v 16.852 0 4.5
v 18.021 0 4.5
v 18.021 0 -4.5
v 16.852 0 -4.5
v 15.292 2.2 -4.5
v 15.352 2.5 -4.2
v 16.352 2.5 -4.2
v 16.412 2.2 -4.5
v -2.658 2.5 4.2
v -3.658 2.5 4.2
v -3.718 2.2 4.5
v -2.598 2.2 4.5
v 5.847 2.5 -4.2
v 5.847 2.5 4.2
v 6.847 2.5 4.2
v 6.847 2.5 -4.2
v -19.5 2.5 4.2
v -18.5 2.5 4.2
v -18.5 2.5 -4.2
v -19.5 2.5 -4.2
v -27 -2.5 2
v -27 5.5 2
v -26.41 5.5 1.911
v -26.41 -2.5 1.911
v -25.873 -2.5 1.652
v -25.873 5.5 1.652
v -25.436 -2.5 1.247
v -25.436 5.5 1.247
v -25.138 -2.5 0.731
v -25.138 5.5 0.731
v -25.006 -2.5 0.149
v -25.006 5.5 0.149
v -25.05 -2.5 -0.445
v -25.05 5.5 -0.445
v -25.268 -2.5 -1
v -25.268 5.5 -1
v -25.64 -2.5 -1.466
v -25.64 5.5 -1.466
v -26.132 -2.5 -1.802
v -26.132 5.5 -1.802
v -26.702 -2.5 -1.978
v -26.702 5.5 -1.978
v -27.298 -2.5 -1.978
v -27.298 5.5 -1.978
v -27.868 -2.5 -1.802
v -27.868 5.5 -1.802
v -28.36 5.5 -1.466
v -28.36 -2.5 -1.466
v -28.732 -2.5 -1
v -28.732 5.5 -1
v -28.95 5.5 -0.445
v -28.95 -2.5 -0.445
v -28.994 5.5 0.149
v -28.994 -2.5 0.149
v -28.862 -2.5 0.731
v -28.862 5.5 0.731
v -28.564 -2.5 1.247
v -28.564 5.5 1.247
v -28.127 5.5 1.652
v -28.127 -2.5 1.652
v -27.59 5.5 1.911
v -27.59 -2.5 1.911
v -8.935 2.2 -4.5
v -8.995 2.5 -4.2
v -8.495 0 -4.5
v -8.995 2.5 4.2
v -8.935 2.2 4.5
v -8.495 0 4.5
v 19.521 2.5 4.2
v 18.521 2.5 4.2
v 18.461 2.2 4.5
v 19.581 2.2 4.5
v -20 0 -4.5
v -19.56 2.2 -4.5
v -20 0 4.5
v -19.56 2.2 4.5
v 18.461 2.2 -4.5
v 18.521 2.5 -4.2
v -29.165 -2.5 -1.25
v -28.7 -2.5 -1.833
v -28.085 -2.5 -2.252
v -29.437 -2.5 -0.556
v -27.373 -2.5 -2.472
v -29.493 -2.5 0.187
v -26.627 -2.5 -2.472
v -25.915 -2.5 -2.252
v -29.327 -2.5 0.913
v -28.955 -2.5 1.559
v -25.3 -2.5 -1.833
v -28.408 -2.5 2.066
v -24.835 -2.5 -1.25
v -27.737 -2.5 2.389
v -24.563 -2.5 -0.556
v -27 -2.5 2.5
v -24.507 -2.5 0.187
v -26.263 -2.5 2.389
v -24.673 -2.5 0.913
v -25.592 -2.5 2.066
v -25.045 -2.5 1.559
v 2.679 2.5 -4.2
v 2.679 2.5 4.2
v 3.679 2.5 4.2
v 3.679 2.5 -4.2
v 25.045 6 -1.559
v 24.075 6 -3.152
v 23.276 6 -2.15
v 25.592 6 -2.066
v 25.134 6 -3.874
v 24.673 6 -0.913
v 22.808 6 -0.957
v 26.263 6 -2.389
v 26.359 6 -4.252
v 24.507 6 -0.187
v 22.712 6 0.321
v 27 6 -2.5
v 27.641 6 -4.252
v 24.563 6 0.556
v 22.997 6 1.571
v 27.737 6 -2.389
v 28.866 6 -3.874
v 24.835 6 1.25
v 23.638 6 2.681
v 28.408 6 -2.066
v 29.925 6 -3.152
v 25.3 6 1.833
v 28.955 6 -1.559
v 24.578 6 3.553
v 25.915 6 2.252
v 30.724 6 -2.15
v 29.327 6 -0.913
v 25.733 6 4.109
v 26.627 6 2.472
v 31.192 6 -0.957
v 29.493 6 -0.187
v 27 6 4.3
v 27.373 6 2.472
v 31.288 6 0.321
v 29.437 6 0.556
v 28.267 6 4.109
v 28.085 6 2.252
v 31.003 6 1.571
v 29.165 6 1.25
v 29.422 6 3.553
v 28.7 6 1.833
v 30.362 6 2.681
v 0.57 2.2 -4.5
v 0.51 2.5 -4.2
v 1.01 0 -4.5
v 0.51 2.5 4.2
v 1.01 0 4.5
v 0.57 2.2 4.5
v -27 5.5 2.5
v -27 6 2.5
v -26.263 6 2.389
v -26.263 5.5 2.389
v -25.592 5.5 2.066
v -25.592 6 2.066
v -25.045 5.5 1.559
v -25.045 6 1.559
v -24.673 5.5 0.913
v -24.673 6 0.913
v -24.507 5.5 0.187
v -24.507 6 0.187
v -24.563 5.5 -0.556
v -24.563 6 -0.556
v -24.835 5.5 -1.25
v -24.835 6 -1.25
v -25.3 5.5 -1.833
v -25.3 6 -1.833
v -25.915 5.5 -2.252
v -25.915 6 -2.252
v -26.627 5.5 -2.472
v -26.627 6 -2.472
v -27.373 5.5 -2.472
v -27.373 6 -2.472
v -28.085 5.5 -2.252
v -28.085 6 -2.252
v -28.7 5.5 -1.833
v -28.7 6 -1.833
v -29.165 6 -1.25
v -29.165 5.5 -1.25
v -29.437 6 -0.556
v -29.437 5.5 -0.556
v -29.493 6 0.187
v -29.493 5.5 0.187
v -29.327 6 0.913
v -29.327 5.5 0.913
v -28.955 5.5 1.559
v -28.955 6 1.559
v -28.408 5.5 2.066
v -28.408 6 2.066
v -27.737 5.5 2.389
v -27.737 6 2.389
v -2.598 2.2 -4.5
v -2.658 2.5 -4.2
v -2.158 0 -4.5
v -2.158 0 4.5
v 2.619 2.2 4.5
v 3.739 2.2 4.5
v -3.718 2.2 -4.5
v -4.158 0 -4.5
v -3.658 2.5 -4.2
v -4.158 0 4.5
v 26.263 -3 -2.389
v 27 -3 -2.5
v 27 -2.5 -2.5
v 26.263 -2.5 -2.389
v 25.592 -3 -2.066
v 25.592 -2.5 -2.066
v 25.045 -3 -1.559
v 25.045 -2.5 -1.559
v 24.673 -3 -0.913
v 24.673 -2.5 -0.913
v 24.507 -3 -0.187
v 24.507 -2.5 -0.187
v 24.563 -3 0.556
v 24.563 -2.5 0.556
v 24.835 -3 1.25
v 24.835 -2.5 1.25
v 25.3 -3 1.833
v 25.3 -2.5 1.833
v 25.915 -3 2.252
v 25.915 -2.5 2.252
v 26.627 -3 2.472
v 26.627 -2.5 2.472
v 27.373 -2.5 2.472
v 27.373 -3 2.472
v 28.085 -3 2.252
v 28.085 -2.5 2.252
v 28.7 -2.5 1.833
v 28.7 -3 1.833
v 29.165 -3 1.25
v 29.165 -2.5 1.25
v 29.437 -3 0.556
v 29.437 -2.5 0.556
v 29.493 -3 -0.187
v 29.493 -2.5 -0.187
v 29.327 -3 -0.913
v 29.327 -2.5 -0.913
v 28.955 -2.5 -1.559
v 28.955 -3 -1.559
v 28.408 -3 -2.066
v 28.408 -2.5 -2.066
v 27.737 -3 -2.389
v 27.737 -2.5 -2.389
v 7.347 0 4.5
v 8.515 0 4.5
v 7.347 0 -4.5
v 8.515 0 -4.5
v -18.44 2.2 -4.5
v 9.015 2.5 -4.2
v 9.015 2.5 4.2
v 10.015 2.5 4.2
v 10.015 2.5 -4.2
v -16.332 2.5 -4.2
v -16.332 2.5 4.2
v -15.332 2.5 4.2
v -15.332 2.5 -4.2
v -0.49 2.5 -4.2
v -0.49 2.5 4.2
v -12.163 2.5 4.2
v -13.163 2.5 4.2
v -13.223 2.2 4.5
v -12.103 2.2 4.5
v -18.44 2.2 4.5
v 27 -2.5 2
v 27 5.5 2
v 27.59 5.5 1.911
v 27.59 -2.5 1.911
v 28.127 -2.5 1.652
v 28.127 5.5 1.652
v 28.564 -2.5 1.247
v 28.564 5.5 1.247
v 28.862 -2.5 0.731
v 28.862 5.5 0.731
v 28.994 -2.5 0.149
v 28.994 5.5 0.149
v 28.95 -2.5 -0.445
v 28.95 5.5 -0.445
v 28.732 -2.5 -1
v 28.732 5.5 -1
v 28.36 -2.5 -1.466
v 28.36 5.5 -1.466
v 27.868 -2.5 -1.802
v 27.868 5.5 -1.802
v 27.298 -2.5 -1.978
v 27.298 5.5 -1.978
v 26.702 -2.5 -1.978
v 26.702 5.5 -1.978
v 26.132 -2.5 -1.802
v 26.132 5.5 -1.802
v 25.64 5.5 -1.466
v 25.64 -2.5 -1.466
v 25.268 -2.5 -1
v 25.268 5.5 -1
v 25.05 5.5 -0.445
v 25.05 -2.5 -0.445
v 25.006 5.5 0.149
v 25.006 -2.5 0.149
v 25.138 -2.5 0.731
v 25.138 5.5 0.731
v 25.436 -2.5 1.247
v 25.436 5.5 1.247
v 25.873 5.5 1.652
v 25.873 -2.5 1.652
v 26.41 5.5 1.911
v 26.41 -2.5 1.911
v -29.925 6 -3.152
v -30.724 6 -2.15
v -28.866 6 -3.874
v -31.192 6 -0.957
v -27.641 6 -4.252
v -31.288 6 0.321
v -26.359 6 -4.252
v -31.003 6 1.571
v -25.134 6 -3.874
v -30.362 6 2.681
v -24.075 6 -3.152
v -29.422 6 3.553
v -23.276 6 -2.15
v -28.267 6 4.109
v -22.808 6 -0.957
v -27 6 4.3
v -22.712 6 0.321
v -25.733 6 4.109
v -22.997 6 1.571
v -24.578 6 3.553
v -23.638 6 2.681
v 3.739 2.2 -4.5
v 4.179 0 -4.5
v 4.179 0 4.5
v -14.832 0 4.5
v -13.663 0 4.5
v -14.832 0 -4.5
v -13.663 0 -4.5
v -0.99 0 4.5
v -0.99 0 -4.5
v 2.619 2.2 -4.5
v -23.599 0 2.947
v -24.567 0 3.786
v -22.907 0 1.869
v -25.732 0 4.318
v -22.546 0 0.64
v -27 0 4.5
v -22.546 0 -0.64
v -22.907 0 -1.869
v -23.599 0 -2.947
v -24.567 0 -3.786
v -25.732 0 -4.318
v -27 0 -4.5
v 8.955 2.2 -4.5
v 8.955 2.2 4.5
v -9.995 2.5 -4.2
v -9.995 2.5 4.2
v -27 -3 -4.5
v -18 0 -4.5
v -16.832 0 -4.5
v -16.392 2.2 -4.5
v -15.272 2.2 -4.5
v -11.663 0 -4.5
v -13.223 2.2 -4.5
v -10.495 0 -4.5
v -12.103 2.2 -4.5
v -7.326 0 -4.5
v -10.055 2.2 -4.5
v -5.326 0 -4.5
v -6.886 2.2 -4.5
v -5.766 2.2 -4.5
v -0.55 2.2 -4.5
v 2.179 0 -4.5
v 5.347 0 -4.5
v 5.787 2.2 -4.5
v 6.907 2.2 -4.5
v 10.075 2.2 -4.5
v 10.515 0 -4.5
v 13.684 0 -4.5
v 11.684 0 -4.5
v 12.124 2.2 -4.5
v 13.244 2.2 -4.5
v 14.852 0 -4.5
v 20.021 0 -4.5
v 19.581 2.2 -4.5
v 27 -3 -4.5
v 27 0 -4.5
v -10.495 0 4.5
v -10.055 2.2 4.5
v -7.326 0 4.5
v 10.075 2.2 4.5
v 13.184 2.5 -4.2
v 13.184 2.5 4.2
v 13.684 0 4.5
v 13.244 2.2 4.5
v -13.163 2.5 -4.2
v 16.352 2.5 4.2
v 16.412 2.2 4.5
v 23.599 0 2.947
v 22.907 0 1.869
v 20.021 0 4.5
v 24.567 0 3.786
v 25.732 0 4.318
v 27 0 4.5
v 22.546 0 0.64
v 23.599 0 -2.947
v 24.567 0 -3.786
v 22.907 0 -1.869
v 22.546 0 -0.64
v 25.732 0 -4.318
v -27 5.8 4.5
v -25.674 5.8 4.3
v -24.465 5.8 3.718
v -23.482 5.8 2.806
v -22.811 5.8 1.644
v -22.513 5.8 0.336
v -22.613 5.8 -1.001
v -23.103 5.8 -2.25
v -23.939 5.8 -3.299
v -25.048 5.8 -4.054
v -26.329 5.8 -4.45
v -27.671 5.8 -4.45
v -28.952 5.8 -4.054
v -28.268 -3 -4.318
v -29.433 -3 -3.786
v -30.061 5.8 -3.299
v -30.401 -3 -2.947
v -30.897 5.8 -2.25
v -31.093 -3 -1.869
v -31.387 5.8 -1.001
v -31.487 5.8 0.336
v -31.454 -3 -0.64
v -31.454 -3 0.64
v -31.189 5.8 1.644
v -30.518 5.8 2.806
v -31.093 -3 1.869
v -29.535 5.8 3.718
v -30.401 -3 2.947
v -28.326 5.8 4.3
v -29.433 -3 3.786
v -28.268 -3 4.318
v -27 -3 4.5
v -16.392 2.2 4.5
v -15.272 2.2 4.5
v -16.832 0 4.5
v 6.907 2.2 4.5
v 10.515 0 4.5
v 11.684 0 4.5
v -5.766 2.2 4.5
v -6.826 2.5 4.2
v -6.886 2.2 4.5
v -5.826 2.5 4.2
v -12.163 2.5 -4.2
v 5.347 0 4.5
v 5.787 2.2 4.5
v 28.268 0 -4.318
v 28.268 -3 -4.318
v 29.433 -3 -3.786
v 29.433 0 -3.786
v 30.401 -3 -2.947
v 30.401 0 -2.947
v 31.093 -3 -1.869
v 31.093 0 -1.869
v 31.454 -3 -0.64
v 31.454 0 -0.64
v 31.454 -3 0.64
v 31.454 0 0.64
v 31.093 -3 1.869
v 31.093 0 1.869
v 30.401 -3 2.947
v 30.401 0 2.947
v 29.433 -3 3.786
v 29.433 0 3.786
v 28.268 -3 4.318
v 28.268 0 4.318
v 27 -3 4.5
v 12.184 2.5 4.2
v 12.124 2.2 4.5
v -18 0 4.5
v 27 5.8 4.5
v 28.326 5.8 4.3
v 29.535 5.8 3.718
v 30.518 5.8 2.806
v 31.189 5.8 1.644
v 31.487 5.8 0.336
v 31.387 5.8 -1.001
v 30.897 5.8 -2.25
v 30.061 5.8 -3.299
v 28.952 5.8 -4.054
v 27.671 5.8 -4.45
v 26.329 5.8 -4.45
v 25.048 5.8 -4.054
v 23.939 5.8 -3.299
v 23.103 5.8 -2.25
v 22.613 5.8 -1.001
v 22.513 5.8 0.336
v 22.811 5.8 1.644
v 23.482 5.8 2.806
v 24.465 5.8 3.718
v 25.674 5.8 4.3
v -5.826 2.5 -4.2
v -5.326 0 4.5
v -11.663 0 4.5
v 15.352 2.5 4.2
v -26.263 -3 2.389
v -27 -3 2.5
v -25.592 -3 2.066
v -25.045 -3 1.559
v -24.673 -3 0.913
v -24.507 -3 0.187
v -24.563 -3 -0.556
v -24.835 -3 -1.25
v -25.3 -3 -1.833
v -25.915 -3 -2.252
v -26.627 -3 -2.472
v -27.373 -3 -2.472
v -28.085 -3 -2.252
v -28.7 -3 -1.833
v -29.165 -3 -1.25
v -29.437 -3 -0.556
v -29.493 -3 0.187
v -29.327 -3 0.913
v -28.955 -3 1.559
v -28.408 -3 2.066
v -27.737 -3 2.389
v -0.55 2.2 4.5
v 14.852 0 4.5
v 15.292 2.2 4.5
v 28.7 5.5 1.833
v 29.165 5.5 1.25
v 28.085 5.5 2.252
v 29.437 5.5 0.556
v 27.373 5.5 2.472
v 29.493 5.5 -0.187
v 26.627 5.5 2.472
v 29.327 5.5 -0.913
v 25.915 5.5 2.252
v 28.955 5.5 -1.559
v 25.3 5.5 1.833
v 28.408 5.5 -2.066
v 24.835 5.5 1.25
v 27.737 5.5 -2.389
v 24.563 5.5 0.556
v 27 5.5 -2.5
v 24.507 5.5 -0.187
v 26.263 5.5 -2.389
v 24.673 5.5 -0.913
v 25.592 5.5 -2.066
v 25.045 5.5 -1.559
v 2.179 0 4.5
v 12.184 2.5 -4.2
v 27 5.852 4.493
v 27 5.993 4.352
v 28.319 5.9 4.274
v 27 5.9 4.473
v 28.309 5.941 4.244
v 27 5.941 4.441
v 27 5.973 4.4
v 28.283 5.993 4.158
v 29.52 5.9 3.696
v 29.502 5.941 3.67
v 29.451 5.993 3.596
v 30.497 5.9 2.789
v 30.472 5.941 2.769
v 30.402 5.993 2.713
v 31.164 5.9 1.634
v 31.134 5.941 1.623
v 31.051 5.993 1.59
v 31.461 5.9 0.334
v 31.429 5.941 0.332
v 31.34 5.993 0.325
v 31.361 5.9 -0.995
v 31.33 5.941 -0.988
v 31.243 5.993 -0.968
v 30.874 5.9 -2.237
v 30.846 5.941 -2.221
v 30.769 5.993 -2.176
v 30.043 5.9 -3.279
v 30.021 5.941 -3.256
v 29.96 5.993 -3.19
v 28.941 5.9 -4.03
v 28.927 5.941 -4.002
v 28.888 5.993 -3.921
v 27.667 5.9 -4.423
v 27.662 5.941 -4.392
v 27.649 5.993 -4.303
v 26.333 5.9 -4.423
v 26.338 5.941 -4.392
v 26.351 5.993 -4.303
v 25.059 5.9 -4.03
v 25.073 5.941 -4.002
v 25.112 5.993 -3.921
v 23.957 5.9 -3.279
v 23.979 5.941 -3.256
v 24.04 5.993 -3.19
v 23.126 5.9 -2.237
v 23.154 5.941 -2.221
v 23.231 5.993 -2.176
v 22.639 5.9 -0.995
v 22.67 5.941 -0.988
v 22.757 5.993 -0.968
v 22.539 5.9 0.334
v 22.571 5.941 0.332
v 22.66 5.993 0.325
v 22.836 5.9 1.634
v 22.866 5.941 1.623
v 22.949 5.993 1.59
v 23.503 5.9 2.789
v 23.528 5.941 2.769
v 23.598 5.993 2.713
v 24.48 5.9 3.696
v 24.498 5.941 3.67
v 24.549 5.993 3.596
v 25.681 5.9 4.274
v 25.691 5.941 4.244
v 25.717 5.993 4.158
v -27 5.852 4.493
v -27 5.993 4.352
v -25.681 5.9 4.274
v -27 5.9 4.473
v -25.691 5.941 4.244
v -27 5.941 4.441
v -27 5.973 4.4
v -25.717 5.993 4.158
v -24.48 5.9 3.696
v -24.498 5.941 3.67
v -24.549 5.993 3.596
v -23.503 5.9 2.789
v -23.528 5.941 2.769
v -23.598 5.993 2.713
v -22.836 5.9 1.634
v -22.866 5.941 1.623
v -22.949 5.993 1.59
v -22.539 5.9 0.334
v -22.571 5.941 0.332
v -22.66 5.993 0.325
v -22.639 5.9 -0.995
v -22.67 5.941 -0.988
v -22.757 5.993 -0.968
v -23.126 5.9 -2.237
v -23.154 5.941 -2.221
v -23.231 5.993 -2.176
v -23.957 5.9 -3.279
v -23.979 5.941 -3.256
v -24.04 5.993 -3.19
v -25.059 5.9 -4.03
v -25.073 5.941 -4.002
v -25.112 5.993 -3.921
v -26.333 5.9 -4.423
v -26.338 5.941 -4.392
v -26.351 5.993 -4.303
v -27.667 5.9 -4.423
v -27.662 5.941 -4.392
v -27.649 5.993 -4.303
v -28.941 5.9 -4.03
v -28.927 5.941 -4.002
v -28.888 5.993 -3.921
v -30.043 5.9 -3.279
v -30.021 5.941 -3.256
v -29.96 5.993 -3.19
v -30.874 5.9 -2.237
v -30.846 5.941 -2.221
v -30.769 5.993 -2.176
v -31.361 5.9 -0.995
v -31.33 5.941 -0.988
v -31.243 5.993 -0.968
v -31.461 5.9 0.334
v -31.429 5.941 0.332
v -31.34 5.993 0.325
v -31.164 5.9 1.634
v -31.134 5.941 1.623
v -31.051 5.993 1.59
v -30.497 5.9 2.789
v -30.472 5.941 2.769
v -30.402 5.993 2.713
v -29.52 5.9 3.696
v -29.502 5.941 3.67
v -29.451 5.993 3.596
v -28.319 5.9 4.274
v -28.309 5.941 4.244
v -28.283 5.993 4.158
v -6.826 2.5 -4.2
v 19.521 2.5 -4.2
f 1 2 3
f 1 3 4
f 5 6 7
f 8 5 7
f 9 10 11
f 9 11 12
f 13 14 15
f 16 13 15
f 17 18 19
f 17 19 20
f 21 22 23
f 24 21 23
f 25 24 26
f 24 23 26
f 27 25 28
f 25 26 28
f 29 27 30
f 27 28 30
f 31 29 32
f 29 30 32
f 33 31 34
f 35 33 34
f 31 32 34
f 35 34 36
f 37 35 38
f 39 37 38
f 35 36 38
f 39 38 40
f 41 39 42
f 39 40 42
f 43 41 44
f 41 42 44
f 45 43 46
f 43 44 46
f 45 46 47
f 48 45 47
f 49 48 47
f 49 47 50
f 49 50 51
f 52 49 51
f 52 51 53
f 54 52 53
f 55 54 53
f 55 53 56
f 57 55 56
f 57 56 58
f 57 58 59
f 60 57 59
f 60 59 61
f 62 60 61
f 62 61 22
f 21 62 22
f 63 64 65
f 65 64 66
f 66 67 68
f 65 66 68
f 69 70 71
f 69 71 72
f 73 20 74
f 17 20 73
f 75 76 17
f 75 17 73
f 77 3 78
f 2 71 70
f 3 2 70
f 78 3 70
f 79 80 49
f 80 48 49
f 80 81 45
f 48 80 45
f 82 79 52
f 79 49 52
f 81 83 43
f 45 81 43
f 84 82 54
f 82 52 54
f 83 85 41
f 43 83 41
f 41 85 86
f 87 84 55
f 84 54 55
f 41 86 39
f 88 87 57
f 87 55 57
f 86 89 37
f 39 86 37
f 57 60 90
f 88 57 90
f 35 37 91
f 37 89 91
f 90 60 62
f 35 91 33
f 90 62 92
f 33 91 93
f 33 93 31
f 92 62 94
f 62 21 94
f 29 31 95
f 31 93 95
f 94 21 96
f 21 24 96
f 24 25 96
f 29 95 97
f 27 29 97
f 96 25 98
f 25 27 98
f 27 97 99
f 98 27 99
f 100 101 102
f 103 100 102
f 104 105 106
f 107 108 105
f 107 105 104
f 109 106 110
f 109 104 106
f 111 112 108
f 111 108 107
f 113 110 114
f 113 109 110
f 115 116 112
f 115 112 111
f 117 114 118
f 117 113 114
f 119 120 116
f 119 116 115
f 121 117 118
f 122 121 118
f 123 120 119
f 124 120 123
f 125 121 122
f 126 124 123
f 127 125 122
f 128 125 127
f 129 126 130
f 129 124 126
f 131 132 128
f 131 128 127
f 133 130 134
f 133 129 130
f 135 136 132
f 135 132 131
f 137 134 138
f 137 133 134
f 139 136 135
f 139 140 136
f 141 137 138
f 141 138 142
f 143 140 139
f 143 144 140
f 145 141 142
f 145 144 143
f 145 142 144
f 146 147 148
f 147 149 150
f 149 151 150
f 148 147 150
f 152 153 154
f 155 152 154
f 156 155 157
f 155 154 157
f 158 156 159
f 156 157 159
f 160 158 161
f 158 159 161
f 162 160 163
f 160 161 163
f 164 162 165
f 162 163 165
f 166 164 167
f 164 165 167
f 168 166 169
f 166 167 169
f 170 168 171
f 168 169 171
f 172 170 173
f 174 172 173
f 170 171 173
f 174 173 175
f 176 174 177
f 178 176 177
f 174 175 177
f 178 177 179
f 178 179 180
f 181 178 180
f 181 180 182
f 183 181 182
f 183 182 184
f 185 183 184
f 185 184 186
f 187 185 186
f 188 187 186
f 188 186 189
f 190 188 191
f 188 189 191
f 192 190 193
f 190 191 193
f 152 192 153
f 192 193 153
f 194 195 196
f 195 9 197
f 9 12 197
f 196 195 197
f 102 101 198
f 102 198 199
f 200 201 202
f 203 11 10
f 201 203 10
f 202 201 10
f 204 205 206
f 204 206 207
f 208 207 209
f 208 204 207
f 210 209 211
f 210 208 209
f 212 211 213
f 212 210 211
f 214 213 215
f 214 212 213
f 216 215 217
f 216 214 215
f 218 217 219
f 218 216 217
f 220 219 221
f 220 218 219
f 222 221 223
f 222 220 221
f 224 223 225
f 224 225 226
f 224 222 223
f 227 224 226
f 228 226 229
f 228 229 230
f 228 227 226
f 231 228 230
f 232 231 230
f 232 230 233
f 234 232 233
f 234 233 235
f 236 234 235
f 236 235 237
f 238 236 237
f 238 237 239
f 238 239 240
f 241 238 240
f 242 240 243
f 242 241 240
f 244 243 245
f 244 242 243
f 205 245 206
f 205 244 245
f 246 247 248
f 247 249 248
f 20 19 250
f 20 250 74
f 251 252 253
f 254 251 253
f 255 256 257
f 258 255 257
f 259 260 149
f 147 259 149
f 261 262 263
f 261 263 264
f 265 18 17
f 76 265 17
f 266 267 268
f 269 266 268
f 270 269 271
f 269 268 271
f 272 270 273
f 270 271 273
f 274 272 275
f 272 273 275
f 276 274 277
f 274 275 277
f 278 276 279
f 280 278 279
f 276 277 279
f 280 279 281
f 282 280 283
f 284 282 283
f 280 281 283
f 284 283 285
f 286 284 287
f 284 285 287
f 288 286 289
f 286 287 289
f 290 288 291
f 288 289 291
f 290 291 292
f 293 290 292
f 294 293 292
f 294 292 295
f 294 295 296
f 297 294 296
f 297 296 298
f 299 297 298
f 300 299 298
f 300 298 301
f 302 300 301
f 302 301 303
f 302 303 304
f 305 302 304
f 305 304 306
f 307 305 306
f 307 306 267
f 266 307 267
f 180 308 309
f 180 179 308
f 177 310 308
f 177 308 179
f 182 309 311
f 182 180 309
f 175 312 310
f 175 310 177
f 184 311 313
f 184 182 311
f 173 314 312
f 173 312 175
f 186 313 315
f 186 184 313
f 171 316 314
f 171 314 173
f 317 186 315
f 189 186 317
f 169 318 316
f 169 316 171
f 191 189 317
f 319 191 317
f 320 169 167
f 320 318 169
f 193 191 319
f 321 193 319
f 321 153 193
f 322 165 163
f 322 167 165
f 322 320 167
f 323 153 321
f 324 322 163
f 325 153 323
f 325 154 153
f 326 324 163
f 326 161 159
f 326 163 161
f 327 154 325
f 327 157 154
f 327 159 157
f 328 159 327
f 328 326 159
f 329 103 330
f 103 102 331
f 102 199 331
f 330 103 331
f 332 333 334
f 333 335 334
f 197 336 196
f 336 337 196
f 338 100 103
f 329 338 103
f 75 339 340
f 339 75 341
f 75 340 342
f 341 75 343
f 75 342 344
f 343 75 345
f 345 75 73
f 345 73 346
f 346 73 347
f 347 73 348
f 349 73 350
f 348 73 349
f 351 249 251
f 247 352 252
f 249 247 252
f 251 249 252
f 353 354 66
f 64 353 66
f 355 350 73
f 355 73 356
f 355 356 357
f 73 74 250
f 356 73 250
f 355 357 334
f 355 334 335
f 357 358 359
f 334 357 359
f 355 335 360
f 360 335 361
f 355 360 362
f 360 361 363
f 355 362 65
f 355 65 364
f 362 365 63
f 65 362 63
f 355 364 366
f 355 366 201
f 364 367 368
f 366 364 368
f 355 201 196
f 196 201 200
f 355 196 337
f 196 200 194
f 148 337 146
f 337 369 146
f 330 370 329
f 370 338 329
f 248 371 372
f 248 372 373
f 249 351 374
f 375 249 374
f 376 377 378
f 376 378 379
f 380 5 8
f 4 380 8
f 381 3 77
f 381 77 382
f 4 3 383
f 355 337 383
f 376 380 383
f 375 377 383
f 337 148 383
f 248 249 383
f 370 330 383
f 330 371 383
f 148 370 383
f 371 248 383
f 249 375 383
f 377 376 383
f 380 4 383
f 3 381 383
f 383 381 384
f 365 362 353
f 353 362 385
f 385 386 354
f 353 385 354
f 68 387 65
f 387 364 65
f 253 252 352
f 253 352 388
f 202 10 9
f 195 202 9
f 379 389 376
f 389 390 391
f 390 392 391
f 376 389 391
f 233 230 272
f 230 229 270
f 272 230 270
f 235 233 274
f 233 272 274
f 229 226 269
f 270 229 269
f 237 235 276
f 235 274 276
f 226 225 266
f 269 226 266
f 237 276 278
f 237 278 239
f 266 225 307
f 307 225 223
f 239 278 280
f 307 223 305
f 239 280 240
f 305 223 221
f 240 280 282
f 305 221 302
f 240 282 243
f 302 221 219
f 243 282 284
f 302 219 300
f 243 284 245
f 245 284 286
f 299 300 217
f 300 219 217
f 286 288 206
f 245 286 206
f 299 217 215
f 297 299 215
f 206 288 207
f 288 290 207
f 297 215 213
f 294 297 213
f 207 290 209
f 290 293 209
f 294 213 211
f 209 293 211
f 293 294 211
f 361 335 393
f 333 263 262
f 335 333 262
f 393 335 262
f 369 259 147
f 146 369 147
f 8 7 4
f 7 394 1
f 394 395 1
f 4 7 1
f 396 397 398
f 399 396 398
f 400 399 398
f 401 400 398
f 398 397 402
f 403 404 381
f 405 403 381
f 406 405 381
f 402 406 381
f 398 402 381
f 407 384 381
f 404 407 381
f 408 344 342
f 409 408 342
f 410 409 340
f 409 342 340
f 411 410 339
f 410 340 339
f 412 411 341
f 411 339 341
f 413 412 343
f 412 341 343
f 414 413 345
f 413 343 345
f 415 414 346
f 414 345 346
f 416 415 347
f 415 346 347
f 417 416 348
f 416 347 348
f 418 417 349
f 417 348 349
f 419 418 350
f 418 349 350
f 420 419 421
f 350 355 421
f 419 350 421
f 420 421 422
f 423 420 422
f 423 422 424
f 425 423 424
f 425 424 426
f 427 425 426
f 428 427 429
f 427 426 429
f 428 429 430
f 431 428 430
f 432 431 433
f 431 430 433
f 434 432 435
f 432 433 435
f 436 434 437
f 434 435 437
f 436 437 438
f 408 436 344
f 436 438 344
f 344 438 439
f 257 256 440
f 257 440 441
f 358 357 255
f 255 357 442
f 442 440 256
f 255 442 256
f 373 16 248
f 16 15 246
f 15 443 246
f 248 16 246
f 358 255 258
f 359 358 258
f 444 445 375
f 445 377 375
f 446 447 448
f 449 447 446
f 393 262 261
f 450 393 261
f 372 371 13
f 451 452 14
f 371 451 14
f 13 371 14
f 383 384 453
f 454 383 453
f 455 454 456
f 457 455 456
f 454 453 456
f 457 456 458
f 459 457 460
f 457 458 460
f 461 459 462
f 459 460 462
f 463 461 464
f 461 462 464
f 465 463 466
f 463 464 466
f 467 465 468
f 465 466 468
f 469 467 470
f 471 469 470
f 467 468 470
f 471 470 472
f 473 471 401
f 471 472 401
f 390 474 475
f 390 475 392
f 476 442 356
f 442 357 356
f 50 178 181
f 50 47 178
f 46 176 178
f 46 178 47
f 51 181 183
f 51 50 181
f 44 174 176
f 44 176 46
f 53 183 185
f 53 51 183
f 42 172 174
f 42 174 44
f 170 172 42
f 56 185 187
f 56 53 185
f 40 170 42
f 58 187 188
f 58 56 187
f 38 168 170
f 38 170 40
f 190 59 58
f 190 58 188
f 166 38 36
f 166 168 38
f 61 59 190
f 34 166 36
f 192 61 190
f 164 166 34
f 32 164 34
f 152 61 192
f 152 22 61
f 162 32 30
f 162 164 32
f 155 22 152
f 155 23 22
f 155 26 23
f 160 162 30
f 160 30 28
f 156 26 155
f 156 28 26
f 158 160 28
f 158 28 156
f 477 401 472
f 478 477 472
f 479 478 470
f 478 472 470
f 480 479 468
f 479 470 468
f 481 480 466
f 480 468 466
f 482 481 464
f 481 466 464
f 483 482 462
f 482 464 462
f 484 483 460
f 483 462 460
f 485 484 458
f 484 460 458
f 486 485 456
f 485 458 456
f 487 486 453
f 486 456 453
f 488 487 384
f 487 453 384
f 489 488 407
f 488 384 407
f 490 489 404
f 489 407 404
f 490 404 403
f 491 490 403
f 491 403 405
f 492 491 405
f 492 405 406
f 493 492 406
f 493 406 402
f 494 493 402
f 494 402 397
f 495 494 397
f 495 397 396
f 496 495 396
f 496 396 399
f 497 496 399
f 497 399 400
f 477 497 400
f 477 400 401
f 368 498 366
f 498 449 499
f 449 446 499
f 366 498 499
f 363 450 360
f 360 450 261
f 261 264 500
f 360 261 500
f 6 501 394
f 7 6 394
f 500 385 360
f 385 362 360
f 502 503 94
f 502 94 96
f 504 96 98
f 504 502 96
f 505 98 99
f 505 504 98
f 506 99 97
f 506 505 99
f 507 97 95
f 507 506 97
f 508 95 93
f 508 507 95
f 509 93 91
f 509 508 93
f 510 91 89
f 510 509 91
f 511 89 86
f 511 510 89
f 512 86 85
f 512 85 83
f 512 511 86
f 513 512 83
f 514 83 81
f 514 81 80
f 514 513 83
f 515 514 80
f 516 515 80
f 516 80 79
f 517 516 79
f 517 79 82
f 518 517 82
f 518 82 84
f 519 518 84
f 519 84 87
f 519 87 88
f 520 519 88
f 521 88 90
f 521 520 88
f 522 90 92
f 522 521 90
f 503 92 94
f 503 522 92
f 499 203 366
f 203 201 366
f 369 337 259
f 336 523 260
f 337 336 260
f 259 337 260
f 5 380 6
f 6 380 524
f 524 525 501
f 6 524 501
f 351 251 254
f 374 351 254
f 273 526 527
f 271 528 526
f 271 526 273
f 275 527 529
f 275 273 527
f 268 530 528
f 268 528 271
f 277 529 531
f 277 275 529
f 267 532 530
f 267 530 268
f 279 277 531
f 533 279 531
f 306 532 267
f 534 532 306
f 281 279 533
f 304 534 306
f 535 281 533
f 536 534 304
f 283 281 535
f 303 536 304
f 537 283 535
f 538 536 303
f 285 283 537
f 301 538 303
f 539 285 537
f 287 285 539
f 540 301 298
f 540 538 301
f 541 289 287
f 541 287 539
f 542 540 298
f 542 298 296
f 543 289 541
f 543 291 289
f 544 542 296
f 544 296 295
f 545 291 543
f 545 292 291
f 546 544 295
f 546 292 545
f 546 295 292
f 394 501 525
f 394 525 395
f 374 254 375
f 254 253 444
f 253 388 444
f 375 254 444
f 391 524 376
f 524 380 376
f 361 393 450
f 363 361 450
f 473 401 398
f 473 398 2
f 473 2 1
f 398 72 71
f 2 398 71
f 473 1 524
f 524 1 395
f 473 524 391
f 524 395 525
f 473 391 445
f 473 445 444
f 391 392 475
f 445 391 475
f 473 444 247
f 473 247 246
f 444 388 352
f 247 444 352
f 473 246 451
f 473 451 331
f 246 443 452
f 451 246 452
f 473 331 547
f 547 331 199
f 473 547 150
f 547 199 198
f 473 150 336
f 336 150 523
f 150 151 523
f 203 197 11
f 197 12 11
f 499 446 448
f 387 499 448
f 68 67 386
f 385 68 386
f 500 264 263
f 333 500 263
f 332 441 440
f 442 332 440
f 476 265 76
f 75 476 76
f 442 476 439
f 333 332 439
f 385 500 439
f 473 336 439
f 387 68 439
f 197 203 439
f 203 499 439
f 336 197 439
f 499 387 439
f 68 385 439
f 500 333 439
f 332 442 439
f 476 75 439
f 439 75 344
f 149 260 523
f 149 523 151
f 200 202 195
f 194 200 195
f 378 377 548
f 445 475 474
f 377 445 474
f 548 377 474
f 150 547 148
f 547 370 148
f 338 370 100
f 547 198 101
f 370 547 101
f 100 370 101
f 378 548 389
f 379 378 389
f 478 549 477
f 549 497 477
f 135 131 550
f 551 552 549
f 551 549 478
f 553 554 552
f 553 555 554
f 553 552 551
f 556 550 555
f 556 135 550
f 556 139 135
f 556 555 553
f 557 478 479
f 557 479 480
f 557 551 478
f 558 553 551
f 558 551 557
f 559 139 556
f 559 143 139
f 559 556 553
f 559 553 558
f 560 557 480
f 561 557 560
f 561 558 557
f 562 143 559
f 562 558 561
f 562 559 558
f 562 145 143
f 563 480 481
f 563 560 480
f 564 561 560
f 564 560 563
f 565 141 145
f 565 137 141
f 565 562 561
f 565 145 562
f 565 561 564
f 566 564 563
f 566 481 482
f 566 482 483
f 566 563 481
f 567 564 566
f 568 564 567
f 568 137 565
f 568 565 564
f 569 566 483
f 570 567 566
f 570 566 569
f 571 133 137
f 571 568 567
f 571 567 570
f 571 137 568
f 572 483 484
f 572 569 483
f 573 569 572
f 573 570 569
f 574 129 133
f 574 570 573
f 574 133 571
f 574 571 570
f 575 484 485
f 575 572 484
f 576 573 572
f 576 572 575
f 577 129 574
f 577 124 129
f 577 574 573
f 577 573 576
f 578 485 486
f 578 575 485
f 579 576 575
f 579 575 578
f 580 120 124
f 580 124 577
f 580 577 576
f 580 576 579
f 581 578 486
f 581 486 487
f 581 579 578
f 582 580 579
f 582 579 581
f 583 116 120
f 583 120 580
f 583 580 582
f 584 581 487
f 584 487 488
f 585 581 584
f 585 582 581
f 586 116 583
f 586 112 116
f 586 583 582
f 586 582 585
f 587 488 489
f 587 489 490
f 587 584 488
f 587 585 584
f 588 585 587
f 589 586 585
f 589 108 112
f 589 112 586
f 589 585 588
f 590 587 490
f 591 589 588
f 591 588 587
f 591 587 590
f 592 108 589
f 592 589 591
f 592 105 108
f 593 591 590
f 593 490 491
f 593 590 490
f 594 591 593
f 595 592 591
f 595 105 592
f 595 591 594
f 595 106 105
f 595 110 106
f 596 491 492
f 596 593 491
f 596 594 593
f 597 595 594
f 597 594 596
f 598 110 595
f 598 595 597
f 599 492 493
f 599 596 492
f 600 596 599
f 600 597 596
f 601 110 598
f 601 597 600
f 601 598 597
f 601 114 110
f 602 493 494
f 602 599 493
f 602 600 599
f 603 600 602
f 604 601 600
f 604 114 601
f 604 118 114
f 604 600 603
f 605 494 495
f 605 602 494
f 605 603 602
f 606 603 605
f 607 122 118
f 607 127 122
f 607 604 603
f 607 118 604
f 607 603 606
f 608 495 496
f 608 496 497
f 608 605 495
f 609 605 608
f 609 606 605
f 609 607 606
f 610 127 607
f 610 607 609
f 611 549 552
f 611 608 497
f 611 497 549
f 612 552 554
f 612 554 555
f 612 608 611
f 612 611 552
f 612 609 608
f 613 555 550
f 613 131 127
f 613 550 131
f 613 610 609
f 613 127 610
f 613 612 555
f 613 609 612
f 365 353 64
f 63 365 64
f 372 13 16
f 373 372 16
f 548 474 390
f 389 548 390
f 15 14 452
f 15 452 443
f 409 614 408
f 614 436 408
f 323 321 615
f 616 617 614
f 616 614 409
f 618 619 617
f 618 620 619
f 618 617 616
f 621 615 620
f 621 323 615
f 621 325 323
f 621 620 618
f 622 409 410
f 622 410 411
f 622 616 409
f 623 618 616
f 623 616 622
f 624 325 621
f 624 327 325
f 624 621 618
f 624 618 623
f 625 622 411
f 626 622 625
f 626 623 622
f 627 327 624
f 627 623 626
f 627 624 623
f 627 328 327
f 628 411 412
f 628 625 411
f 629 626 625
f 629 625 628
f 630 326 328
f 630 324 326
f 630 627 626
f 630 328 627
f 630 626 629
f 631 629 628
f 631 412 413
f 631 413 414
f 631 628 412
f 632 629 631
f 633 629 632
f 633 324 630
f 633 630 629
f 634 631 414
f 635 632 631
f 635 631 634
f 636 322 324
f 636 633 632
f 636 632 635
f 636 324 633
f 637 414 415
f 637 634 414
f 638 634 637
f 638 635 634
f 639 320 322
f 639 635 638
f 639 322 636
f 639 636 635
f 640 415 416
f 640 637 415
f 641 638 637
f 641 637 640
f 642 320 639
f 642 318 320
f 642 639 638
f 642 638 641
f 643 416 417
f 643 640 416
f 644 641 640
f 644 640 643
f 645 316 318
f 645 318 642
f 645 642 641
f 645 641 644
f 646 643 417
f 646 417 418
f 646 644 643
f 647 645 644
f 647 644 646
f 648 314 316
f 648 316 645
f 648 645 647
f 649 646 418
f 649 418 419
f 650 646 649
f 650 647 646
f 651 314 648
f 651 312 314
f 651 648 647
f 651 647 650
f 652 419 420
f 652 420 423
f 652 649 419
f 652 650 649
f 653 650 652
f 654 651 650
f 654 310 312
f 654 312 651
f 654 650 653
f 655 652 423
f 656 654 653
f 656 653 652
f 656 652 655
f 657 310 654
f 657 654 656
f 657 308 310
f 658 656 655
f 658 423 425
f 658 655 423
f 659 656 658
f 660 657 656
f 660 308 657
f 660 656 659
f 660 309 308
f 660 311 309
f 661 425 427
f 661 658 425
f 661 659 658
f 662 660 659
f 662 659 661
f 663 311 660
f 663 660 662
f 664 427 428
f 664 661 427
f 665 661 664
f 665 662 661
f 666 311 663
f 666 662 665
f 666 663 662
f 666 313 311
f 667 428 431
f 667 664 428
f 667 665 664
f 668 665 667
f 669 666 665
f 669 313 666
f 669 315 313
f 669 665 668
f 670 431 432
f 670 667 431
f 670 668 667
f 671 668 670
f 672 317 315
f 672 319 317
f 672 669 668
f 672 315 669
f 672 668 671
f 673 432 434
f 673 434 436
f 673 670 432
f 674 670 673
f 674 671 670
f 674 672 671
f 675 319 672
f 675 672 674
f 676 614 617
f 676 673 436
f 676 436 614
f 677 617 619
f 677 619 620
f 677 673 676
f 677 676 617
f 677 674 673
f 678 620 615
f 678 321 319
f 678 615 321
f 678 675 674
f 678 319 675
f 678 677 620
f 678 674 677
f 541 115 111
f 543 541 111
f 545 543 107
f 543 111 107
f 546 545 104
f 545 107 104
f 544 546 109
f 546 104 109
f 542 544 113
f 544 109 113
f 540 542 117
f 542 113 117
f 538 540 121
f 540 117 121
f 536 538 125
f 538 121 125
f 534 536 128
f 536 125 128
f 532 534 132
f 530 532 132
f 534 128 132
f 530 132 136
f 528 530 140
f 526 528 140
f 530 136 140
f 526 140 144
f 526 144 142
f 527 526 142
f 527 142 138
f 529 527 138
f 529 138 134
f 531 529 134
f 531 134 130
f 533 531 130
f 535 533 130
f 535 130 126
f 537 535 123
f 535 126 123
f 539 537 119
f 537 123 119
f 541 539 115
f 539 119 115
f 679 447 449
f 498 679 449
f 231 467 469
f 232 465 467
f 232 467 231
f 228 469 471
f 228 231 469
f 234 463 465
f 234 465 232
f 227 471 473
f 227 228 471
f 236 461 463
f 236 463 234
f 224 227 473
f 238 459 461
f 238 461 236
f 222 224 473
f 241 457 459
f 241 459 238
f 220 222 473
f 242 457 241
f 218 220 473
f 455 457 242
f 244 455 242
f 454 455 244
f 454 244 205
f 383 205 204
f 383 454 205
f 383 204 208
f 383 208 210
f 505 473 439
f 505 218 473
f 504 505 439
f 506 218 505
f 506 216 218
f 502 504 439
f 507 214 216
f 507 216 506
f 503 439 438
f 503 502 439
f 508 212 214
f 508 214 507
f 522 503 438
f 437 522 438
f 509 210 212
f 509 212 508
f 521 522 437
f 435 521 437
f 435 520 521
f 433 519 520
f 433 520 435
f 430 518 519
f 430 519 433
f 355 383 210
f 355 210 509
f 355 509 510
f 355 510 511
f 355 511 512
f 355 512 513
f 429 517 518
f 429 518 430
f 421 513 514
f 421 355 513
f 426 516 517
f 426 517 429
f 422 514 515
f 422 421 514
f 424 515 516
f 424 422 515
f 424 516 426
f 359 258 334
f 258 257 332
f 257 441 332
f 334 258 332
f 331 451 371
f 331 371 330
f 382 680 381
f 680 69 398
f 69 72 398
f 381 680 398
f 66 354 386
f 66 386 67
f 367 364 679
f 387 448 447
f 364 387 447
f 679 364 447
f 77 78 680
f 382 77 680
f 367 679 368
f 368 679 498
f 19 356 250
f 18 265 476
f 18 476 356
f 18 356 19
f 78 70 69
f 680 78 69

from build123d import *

# Parameters (mm, degrees)
BOSS_EXTRUDE1_DEPTH = 3
SKETCH2_R           = 4.5
BOSS_EXTRUDE2_DEPTH = 6
CUT_EXTRUDE1_REACH  = 35.068
SKETCH3_R           = 2
SKETCH4_R           = 2.5
CUT_EXTRUDE2_DEPTH  = 0.5
BOSS_EXTRUDE4_DEPTH = 9
CHAMFER1_SIZE       = 0.3
FILLET1_R           = 0.2


with BuildPart() as part:
    # Sketch1 → Boss-Extrude1 (new body)
    with BuildSketch(Plane(origin=(0, 0, 0), x_dir=(1, 0, 0), z_dir=(0, 1, 0))):
        with BuildLine():
            Line((-27, 4.5), (27, 4.5))
            ThreePointArc((27, 4.5), (31.5, 0), (27, -4.5))
            Line((27, -4.5), (-27, -4.5))
            ThreePointArc((-27, -4.5), (-31.5, 0), (-27, 4.5))
        make_face()
    extrude(amount=-BOSS_EXTRUDE1_DEPTH)

    # Sketch2 → Boss-Extrude2 (add)
    with BuildSketch(Plane(origin=(0, 0, 0), x_dir=(1, 0, 0), z_dir=(0, 1, 0))):
        with Locations(Location((-27, 0, 0), (0, 0, 270))):
            Circle(SKETCH2_R)
        with Locations(Location((27, 0, 0), (0, 0, 270))):
            Circle(SKETCH2_R)
    extrude(amount=BOSS_EXTRUDE2_DEPTH)

    # Sketch3 → Cut-Extrude1 (cut, up to next)
    with BuildSketch(Plane(origin=(0, 6, 0), x_dir=(1, 0, 0), z_dir=(0, 1, 0)), mode=Mode.PRIVATE) as cut_extrude1_sk1:
        with Locations(Location((-27, 0, 0), (0, 0, 270))):
            Circle(SKETCH3_R)
    cut_extrude1_tool1 = extrude(cut_extrude1_sk1.sketch, amount=-CUT_EXTRUDE1_REACH, mode=Mode.PRIVATE) & part.part
    # Sketch3 → Cut-Extrude1 (cut, up to next)
    with BuildSketch(Plane(origin=(0, 6, 0), x_dir=(1, 0, 0), z_dir=(0, 1, 0)), mode=Mode.PRIVATE) as cut_extrude1_sk2:
        with Locations(Location((27, 0, 0), (0, 0, 270))):
            Circle(SKETCH3_R)
    cut_extrude1_tool2 = extrude(cut_extrude1_sk2.sketch, amount=-CUT_EXTRUDE1_REACH, mode=Mode.PRIVATE) & part.part
    add(cut_extrude1_tool1.solids().sort_by_distance((-27, 6, 0))[0], mode=Mode.SUBTRACT)
    add(cut_extrude1_tool2.solids().sort_by_distance((27, 6, 0))[0], mode=Mode.SUBTRACT)

    # Sketch4 → Cut-Extrude2 (cut)
    with BuildSketch(Plane(origin=(0, 6, 0), x_dir=(1, 0, 0), z_dir=(0, 1, 0))):
        with Locations(Location((-27, 0, 0), (0, 0, 270))):
            Circle(SKETCH4_R)
        with Locations(Location((27, 0, 0), (0, 0, 90))):
            Circle(SKETCH4_R)
    cut_extrude2 = extrude(amount=-CUT_EXTRUDE2_DEPTH, mode=Mode.SUBTRACT)

    # Mirror1: Cut-Extrude2 across plane
    add(cut_extrude2.mirror(Plane(origin=(0, 1.5, 0), x_dir=(0, 0, 1), z_dir=(0, -1, 0))), mode=Mode.SUBTRACT)

    # Sketch21 → Boss-Extrude4 (add)
    with BuildSketch(Plane.XY.offset(4.5)):
        Polygon((-20, 0), (-18, 0), (-18.5, 2.5), (-19.5, 2.5), align=None)
        Polygon((-16.831620529, 0), (-16.331620529, 2.5), (-15.331620529, 2.5), (-14.831620529, 0), align=None)
        Polygon((-13.663241058, 0), (-13.163241058, 2.5), (-12.163241058, 2.5), (-11.663241058, 0), align=None)
        Polygon((-10.494861587, 0), (-9.994861587, 2.5), (-8.994861587, 2.5), (-8.494861587, 0), align=None)
        Polygon((-7.326482116, 0), (-6.826482116, 2.5), (-5.826482116, 2.5), (-5.326482116, 0), align=None)
        Polygon((-4.158102645, 0), (-3.658102645, 2.5), (-2.658102645, 2.5), (-2.158102645, 0), align=None)
        Polygon((-0.989723174, 0), (-0.489723174, 2.5), (0.510276826, 2.5), (1.010276826, 0), align=None)
        Polygon((2.178656297, 0), (2.678656297, 2.5), (3.678656297, 2.5), (4.178656297, 0), align=None)
        Polygon((5.347035768, 0), (5.847035768, 2.5), (6.847035768, 2.5), (7.347035768, 0), align=None)
        Polygon((8.515415239, 0), (9.015415239, 2.5), (10.015415239, 2.5), (10.515415239, 0), align=None)
        Polygon((11.68379471, 0), (12.18379471, 2.5), (13.18379471, 2.5), (13.68379471, 0), align=None)
        Polygon((14.852174181, 0), (15.352174181, 2.5), (16.352174181, 2.5), (16.852174181, 0), align=None)
        Polygon((18.020553652, 0), (18.520553652, 2.5), (19.520553652, 2.5), (20.020553652, 0), align=None)
    extrude(amount=-BOSS_EXTRUDE4_DEPTH)

    # Chamfer1
    chamfer1_edges = [part.edges().sort_by_distance(p)[0] for p in [
        (-6.326482116, 2.5, 4.5),
        (-6.326482116, 2.5, -4.5),
        (-3.158102645, 2.5, 4.5),
        (-3.158102645, 2.5, -4.5),
        (0.010276826, 2.5, 4.5),
        (0.010276826, 2.5, -4.5),
        (3.178656297, 2.5, 4.5),
        (3.178656297, 2.5, -4.5),
        (6.347035768, 2.5, 4.5),
        (6.347035768, 2.5, -4.5),
        (9.515415239, 2.5, 4.5),
        (9.515415239, 2.5, -4.5),
        (12.68379471, 2.5, 4.5),
        (12.68379471, 2.5, -4.5),
        (15.852174181, 2.5, 4.5),
        (15.852174181, 2.5, -4.5),
        (19.020553652, 2.5, 4.5),
        (19.020553652, 2.5, -4.5),
        (-19, 2.5, 4.5),
        (-19, 2.5, -4.5),
        (-15.831620529, 2.5, 4.5),
        (-15.831620529, 2.5, -4.5),
        (-12.663241058, 2.5, 4.5),
        (-12.663241058, 2.5, -4.5),
        (-9.494861587, 2.5, 4.5),
        (-9.494861587, 2.5, -4.5),
    ]]
    chamfer(chamfer1_edges, length=CHAMFER1_SIZE)

    # Fillet1
    fillet1_edges = [part.edges().sort_by_distance(p)[0] for p in [
        (-27, 6, -4.5),
        (27, 6, -4.5),
    ]]
    fillet(fillet1_edges, radius=FILLET1_R)


solid = part.part
